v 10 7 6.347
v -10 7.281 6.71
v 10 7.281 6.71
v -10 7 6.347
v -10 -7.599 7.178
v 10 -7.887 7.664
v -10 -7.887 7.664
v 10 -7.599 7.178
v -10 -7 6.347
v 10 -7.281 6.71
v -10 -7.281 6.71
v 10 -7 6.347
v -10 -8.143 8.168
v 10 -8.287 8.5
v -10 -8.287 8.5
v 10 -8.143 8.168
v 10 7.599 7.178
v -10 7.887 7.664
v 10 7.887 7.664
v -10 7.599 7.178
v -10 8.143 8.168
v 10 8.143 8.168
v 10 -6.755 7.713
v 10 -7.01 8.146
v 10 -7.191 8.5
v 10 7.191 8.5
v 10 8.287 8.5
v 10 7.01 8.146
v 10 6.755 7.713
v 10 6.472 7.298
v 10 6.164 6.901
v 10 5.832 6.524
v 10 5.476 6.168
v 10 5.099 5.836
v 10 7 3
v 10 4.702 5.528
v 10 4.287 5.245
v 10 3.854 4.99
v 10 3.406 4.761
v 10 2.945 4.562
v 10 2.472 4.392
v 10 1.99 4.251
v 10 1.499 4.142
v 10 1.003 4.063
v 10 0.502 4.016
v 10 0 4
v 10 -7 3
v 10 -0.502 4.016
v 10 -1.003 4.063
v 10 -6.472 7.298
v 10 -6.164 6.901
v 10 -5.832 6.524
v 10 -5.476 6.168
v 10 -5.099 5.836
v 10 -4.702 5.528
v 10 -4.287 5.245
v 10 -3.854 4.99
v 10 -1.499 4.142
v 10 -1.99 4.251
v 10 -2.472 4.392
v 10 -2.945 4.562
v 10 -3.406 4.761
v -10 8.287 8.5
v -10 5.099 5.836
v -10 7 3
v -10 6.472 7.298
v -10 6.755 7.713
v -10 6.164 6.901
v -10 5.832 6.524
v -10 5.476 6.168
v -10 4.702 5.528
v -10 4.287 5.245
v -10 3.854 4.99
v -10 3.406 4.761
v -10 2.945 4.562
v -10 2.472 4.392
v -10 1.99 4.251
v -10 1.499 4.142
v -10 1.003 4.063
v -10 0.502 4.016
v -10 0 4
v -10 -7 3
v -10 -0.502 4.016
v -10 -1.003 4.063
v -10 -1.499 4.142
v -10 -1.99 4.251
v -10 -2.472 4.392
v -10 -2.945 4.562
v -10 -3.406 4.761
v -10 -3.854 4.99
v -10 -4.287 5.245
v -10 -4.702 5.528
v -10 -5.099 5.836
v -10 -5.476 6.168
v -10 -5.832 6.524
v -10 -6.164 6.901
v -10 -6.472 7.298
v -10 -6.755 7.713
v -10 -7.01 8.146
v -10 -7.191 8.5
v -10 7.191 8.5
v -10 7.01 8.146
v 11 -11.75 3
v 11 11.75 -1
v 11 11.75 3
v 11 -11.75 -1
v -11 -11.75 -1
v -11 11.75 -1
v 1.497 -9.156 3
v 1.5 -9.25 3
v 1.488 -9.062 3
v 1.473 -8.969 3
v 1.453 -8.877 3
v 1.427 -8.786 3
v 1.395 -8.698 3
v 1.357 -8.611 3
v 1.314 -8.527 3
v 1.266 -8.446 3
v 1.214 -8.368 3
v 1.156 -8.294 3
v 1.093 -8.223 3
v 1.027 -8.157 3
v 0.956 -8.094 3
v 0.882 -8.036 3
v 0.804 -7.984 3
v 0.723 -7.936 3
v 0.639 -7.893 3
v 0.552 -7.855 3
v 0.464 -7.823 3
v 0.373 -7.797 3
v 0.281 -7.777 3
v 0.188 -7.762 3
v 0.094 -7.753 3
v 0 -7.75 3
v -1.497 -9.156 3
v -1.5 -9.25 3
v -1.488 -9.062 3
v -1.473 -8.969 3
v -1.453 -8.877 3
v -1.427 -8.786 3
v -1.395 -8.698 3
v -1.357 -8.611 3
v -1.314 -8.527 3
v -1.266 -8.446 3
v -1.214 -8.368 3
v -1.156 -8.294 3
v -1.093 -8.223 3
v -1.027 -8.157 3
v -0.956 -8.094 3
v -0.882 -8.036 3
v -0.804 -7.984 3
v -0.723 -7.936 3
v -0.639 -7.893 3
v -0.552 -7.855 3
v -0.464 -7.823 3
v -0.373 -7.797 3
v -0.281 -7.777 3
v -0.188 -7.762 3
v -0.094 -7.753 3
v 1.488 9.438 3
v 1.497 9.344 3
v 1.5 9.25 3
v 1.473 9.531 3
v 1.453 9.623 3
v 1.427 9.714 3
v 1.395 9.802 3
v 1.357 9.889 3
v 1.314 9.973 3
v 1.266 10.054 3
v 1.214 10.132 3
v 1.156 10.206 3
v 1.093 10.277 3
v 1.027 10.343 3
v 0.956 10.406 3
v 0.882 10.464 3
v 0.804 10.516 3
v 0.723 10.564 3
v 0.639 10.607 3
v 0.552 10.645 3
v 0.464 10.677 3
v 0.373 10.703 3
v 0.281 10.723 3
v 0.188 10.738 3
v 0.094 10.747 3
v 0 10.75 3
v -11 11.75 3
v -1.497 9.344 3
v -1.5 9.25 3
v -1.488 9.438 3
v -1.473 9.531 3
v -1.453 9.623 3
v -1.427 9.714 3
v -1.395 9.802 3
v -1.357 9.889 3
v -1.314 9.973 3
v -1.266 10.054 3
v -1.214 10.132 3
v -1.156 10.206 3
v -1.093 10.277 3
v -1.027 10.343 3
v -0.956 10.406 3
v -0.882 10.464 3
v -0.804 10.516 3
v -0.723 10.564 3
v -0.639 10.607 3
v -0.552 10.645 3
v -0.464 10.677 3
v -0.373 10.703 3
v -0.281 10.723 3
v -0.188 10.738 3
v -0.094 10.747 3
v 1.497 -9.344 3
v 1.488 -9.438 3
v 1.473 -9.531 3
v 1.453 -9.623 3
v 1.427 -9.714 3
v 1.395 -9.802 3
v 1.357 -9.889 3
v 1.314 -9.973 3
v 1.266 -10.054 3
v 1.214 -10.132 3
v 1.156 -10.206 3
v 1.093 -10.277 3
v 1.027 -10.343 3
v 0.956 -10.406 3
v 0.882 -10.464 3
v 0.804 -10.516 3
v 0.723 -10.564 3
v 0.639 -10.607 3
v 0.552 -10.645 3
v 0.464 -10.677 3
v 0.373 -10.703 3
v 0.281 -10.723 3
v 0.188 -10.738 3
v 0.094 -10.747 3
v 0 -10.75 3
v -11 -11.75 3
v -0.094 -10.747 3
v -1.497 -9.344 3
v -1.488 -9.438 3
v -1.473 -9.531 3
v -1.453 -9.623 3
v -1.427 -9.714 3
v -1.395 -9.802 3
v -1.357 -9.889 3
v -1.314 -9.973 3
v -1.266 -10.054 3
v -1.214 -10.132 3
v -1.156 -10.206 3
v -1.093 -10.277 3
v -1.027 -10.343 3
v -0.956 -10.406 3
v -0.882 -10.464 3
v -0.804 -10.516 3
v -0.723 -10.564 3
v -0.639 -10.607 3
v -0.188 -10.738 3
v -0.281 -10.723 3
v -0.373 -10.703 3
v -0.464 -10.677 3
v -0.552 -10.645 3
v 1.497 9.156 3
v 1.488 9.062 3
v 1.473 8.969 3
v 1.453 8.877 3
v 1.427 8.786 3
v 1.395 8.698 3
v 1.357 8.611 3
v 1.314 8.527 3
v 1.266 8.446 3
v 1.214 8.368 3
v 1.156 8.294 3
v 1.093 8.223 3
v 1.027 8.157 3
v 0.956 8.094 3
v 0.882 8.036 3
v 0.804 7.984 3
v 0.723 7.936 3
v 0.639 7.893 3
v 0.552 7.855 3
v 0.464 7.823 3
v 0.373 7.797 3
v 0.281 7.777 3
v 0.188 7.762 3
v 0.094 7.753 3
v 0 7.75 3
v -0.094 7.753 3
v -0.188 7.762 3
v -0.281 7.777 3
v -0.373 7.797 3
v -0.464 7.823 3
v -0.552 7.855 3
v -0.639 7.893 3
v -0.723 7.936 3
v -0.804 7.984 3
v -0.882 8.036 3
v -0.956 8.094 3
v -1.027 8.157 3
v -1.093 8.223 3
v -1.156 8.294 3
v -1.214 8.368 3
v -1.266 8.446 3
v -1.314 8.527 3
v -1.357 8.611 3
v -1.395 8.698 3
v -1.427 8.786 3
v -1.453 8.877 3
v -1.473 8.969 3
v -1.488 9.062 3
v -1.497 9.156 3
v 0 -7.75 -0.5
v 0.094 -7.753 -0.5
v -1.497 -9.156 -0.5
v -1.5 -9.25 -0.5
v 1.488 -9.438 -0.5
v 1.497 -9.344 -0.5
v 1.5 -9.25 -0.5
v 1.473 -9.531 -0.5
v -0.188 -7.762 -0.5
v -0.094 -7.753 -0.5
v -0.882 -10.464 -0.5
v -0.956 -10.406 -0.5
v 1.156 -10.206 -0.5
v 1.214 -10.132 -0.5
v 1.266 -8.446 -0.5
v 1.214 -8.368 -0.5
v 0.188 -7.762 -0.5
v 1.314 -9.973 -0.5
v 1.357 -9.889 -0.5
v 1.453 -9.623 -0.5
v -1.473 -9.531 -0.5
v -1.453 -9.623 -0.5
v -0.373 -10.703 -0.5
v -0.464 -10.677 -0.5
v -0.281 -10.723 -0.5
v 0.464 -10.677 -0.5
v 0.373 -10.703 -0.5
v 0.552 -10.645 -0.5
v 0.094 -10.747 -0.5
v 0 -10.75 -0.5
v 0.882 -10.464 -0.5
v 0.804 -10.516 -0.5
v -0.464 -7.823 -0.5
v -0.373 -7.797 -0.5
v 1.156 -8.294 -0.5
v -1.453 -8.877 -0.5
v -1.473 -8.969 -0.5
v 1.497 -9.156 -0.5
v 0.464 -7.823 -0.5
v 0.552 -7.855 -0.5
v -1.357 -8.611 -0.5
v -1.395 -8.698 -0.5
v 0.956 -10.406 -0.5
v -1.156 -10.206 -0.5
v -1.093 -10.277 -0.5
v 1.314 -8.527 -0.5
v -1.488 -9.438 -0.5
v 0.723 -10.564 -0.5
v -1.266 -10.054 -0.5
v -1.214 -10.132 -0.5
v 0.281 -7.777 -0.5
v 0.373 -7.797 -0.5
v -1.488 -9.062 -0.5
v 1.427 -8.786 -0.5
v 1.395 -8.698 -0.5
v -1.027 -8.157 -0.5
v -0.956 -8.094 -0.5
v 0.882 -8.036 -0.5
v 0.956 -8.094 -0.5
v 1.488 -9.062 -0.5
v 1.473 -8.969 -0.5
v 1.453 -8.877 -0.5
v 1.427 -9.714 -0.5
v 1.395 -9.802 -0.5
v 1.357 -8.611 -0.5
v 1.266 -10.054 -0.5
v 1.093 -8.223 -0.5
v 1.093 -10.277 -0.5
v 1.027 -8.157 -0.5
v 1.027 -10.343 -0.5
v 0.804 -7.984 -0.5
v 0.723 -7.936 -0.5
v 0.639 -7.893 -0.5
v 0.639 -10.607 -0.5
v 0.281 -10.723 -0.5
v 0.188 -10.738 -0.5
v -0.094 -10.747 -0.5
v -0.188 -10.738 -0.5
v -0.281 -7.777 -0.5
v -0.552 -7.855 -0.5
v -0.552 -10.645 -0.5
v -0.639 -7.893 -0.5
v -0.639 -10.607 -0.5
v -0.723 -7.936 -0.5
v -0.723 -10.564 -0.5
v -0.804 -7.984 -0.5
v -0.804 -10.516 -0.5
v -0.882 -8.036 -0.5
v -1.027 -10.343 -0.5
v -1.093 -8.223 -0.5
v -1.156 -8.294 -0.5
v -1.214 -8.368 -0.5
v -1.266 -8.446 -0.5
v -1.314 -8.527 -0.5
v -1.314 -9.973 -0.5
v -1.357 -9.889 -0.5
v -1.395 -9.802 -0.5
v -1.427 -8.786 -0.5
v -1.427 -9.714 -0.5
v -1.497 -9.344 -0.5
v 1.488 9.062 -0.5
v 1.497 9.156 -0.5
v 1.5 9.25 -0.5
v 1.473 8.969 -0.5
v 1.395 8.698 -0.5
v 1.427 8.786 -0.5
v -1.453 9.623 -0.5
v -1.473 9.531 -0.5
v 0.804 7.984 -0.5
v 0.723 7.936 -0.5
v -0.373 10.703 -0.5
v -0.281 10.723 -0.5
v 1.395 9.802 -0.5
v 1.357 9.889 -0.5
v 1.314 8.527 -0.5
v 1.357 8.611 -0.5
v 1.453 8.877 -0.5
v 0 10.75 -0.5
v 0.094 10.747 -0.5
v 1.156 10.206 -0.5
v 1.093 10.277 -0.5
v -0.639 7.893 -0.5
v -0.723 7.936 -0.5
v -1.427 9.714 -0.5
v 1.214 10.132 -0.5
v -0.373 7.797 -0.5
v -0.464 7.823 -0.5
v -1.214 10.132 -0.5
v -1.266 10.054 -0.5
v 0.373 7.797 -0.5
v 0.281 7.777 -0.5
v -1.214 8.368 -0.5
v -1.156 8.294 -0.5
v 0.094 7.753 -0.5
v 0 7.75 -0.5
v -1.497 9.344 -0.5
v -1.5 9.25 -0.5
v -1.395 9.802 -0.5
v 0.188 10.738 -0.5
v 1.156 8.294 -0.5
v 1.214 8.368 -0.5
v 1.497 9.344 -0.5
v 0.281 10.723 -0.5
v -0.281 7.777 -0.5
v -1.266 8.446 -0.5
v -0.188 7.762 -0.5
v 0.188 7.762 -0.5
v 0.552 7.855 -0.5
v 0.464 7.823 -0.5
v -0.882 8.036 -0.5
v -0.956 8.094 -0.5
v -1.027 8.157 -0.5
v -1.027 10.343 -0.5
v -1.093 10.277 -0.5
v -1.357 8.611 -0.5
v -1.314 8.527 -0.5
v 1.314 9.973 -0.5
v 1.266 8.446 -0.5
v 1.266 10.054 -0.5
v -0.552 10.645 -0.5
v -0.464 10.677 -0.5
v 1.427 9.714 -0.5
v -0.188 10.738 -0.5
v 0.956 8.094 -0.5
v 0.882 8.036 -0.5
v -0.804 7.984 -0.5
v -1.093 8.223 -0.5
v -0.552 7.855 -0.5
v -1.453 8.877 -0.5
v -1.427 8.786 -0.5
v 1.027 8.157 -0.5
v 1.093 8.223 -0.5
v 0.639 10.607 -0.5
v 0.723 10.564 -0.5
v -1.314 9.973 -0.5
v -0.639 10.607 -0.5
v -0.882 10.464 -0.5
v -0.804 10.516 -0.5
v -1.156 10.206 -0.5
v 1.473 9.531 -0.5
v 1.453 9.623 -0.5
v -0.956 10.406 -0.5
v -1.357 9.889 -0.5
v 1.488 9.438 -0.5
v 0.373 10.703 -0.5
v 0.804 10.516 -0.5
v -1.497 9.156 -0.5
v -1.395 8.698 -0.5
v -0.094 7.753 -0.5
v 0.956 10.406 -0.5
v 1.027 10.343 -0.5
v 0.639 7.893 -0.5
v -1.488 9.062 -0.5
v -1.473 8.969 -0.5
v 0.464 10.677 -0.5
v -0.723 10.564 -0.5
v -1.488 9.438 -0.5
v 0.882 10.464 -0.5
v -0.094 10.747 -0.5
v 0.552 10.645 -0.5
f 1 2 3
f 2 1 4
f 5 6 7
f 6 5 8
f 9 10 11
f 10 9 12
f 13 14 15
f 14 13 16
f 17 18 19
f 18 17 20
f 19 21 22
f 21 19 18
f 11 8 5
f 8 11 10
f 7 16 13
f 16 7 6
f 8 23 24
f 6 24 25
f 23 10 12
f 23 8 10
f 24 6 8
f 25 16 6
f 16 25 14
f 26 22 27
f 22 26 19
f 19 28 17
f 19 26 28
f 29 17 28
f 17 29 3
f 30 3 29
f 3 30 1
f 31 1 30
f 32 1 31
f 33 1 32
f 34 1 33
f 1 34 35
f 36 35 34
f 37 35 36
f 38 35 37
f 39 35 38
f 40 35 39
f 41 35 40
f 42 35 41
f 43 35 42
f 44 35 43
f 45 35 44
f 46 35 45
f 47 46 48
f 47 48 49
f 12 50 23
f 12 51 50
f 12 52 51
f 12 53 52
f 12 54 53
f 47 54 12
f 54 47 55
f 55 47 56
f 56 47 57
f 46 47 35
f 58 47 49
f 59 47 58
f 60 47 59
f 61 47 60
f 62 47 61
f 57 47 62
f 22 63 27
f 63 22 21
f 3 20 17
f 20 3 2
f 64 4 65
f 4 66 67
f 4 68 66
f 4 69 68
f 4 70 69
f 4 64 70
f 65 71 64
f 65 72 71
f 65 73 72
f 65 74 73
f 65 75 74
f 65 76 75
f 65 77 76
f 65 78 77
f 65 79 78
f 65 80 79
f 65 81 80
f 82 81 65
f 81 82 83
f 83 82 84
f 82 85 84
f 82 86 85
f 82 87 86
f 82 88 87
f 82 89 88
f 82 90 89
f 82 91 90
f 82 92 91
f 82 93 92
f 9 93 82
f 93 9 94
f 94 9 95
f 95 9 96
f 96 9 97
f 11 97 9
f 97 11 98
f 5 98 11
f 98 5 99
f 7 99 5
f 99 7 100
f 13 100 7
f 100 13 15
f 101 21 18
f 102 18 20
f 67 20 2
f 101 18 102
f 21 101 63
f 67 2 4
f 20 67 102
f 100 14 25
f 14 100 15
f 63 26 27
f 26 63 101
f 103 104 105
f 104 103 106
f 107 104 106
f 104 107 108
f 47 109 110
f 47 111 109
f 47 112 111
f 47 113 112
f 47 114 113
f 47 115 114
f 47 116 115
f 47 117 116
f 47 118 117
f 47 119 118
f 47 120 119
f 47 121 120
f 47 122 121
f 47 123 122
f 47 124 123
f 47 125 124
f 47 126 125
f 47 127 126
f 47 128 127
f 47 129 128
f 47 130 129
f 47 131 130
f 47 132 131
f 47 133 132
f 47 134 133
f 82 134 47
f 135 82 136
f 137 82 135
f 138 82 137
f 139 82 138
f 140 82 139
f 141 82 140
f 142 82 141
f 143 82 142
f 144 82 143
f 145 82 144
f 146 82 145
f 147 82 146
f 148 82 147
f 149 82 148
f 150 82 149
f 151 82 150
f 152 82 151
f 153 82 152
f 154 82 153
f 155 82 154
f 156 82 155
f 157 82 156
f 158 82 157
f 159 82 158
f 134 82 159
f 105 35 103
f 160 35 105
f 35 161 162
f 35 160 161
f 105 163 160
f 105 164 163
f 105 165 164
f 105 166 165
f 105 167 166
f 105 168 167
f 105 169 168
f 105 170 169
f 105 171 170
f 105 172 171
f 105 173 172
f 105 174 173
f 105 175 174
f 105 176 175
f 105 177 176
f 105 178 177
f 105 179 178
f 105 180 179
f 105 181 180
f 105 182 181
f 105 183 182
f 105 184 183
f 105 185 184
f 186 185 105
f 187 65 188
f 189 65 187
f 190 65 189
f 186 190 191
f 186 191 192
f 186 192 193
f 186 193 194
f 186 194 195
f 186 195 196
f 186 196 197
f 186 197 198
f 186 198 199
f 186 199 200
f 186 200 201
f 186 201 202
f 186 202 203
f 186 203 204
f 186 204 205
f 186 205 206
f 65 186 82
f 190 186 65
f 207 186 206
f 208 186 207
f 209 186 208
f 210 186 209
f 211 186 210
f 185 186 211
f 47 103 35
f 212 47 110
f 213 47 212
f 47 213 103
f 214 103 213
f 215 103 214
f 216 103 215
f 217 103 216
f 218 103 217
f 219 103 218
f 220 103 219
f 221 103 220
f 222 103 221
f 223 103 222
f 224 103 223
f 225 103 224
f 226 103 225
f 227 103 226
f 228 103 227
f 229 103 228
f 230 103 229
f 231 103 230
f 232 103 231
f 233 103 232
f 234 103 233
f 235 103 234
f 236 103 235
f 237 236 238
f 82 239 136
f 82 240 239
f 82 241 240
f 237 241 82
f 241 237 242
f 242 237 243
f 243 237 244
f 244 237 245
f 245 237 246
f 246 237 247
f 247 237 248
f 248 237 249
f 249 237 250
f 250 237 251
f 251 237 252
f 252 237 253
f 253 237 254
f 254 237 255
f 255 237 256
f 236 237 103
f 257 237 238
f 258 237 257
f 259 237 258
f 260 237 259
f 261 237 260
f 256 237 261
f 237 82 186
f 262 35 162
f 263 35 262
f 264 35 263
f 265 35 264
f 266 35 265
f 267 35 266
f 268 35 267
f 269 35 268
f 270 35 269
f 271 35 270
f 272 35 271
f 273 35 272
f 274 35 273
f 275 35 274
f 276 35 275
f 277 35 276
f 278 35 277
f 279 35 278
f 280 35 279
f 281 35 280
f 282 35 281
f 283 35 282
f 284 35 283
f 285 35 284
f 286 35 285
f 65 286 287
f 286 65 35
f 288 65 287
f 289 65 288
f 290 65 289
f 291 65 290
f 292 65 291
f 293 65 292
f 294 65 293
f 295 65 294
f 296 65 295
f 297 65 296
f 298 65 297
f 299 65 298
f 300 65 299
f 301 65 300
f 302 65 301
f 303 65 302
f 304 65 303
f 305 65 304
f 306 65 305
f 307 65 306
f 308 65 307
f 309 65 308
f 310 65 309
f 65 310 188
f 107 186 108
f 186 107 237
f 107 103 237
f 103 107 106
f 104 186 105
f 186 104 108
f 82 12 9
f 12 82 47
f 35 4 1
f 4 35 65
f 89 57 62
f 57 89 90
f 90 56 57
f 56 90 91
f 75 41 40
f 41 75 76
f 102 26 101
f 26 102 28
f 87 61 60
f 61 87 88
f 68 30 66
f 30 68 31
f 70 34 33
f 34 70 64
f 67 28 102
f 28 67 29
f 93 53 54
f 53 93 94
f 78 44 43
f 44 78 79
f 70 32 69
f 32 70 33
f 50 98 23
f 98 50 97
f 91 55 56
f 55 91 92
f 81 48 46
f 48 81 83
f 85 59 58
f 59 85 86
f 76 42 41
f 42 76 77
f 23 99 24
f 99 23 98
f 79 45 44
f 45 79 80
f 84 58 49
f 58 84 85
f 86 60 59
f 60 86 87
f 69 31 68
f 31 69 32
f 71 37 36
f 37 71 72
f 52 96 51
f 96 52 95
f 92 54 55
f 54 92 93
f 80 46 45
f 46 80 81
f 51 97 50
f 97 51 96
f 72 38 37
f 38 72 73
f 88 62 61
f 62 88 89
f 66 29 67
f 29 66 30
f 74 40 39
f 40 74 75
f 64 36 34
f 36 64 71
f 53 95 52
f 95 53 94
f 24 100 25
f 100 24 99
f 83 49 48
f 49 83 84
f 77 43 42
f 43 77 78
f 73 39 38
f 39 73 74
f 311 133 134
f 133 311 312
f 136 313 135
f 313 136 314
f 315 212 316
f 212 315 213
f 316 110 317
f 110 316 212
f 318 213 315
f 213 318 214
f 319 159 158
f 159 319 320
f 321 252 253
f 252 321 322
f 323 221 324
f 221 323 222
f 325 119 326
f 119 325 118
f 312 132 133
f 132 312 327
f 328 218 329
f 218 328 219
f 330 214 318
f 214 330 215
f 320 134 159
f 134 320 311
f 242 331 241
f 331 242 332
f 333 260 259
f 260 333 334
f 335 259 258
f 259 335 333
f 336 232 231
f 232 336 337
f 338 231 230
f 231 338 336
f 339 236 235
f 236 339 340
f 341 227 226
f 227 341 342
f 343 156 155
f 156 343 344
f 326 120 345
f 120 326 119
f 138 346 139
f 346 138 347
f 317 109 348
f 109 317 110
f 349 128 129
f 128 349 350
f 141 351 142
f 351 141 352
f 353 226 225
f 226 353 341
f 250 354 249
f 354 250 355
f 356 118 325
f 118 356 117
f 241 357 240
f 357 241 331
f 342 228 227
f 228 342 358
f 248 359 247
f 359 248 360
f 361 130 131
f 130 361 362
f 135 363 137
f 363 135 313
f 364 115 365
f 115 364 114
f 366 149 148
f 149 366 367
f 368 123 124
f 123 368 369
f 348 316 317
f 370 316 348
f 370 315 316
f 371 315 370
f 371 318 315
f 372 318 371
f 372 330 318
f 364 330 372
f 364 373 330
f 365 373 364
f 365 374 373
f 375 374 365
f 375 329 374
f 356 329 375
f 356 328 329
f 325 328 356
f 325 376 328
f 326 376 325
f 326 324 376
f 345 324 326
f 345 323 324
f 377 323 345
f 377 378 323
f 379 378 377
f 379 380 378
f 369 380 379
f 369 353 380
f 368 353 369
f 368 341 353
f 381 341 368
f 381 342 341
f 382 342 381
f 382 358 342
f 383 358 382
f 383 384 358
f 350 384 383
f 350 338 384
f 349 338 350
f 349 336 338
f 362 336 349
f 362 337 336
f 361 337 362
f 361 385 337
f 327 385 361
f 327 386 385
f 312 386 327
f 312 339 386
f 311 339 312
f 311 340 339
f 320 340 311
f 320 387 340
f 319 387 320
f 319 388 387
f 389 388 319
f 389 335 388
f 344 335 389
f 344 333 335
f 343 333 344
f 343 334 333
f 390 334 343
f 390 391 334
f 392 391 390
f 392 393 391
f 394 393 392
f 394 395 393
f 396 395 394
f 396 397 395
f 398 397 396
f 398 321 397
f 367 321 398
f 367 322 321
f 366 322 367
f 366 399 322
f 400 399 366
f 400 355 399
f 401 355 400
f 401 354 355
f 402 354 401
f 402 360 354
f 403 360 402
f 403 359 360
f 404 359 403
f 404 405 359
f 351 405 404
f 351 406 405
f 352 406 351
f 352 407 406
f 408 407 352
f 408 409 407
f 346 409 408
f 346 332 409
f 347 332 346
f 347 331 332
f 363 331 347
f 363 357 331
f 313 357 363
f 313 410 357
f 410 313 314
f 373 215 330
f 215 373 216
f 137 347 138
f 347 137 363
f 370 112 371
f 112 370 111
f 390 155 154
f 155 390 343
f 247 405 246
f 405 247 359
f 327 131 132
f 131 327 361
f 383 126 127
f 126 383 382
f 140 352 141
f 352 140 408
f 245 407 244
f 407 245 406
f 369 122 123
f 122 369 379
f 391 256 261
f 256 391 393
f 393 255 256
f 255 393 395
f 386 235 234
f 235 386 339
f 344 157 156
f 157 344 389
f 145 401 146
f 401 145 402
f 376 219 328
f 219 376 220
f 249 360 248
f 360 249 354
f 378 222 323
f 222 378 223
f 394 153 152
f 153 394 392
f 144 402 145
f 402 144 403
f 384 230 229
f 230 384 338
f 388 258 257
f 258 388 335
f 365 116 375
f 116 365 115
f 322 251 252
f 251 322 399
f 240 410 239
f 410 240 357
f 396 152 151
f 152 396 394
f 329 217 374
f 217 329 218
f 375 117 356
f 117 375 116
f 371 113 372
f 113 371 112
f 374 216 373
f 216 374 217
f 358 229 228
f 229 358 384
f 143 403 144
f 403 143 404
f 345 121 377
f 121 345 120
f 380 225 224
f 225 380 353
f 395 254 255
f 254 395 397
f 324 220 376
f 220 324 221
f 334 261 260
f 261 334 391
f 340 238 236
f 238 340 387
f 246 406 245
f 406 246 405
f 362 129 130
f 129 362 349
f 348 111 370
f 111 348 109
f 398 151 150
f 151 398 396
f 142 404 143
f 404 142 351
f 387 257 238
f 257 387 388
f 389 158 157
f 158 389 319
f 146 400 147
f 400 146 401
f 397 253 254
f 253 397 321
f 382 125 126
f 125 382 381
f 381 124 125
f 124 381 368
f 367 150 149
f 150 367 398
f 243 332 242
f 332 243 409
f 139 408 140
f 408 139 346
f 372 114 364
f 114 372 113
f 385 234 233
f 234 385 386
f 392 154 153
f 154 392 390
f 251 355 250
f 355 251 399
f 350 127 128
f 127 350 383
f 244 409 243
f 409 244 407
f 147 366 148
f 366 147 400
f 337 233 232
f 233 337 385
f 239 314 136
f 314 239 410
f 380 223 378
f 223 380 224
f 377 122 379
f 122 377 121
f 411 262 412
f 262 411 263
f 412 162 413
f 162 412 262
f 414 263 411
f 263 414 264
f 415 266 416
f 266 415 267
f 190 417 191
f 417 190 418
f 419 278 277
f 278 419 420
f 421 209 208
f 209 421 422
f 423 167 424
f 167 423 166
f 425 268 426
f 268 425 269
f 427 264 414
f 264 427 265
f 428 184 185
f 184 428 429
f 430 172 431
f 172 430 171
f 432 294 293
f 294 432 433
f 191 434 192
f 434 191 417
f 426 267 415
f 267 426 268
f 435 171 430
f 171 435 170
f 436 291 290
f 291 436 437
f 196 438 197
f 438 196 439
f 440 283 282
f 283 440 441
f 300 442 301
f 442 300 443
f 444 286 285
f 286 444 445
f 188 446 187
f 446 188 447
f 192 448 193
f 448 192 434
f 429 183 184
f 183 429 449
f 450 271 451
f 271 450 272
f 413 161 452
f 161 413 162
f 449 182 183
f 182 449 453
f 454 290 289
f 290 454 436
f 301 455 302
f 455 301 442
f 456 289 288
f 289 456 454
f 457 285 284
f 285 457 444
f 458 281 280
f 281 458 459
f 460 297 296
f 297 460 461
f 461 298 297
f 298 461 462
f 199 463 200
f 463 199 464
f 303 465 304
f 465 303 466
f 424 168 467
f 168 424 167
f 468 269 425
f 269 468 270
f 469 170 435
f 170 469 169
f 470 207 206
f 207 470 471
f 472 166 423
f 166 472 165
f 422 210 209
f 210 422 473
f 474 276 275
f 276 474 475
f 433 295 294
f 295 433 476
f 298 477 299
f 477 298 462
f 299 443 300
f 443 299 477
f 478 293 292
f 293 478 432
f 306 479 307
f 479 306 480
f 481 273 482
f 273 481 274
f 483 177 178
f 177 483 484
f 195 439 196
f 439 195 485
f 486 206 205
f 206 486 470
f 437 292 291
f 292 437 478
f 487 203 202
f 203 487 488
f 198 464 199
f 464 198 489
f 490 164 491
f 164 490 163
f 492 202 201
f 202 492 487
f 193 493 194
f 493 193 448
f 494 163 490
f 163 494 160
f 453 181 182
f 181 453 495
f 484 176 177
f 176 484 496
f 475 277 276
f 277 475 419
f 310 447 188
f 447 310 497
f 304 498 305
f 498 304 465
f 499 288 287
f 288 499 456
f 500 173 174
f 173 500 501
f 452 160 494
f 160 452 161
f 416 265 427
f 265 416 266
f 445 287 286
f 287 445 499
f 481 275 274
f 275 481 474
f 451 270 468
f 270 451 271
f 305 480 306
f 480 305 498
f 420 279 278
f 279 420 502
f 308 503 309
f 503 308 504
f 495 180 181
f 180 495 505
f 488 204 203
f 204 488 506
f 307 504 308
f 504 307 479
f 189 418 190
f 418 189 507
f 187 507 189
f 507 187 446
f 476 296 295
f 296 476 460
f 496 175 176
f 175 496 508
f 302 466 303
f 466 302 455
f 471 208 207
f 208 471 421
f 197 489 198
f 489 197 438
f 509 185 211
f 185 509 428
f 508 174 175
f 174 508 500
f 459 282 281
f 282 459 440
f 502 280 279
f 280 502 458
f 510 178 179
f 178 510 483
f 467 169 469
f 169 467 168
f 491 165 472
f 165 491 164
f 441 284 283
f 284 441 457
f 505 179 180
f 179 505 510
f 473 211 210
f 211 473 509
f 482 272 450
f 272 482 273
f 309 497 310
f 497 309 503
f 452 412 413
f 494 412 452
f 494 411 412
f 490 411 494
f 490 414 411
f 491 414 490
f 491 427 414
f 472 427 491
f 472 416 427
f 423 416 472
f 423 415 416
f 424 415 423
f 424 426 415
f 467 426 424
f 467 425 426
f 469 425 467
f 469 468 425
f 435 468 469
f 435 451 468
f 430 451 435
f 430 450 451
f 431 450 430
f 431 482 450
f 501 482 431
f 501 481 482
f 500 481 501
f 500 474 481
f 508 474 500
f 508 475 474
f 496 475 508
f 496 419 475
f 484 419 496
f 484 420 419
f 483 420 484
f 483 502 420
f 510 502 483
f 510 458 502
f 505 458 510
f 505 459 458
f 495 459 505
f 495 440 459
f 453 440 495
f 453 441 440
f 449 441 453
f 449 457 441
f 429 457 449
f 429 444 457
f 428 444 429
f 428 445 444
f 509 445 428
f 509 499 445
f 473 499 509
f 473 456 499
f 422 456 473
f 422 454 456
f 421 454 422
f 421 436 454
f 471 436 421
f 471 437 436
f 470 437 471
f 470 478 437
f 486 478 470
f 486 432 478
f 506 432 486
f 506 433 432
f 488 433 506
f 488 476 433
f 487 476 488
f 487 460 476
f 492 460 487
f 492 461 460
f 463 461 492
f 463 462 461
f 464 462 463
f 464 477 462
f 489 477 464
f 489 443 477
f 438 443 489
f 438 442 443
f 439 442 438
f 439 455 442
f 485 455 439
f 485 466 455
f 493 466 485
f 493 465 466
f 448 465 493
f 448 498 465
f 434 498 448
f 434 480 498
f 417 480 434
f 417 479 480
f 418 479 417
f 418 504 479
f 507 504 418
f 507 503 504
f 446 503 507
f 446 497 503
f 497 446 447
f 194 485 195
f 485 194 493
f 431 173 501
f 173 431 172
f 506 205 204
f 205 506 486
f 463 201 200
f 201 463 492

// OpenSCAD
BaseHeight = 4;
BaseWidth = 23.5;
HoleRadius = 1.5;
LMRadius = 8;

/* [HIDDEN] */
$fn = 100;

translate([0,0,12])
    rotate([180,0,0])
        comFuro();

module base(){
    translate([0,0,9+BaseHeight/2]) 
        cube([22,BaseWidth,BaseHeight],center=true);
    translate([0,0,8]) 
        cube([20,14,6],center=true);
    rotate([0,90,0]){
        difference(){
            cylinder(h=20,r=LMRadius+1,center=true);            
            translate([8,0,0])cube([23,23,32],center=true);
        }
    }
}
module comFuro(){
    difference()
    {
        y = (BaseWidth/2)-1-HoleRadius;
        base();
        rotate([0,90,0])
            cylinder(h=24,r=LMRadius,center=true);        
        translate([0,y,10]) 
            cylinder(r=HoleRadius,h=5,center=true);
        translate([0,-y,10]) 
            cylinder(r=HoleRadius,h=5,center=true);
    }
}
